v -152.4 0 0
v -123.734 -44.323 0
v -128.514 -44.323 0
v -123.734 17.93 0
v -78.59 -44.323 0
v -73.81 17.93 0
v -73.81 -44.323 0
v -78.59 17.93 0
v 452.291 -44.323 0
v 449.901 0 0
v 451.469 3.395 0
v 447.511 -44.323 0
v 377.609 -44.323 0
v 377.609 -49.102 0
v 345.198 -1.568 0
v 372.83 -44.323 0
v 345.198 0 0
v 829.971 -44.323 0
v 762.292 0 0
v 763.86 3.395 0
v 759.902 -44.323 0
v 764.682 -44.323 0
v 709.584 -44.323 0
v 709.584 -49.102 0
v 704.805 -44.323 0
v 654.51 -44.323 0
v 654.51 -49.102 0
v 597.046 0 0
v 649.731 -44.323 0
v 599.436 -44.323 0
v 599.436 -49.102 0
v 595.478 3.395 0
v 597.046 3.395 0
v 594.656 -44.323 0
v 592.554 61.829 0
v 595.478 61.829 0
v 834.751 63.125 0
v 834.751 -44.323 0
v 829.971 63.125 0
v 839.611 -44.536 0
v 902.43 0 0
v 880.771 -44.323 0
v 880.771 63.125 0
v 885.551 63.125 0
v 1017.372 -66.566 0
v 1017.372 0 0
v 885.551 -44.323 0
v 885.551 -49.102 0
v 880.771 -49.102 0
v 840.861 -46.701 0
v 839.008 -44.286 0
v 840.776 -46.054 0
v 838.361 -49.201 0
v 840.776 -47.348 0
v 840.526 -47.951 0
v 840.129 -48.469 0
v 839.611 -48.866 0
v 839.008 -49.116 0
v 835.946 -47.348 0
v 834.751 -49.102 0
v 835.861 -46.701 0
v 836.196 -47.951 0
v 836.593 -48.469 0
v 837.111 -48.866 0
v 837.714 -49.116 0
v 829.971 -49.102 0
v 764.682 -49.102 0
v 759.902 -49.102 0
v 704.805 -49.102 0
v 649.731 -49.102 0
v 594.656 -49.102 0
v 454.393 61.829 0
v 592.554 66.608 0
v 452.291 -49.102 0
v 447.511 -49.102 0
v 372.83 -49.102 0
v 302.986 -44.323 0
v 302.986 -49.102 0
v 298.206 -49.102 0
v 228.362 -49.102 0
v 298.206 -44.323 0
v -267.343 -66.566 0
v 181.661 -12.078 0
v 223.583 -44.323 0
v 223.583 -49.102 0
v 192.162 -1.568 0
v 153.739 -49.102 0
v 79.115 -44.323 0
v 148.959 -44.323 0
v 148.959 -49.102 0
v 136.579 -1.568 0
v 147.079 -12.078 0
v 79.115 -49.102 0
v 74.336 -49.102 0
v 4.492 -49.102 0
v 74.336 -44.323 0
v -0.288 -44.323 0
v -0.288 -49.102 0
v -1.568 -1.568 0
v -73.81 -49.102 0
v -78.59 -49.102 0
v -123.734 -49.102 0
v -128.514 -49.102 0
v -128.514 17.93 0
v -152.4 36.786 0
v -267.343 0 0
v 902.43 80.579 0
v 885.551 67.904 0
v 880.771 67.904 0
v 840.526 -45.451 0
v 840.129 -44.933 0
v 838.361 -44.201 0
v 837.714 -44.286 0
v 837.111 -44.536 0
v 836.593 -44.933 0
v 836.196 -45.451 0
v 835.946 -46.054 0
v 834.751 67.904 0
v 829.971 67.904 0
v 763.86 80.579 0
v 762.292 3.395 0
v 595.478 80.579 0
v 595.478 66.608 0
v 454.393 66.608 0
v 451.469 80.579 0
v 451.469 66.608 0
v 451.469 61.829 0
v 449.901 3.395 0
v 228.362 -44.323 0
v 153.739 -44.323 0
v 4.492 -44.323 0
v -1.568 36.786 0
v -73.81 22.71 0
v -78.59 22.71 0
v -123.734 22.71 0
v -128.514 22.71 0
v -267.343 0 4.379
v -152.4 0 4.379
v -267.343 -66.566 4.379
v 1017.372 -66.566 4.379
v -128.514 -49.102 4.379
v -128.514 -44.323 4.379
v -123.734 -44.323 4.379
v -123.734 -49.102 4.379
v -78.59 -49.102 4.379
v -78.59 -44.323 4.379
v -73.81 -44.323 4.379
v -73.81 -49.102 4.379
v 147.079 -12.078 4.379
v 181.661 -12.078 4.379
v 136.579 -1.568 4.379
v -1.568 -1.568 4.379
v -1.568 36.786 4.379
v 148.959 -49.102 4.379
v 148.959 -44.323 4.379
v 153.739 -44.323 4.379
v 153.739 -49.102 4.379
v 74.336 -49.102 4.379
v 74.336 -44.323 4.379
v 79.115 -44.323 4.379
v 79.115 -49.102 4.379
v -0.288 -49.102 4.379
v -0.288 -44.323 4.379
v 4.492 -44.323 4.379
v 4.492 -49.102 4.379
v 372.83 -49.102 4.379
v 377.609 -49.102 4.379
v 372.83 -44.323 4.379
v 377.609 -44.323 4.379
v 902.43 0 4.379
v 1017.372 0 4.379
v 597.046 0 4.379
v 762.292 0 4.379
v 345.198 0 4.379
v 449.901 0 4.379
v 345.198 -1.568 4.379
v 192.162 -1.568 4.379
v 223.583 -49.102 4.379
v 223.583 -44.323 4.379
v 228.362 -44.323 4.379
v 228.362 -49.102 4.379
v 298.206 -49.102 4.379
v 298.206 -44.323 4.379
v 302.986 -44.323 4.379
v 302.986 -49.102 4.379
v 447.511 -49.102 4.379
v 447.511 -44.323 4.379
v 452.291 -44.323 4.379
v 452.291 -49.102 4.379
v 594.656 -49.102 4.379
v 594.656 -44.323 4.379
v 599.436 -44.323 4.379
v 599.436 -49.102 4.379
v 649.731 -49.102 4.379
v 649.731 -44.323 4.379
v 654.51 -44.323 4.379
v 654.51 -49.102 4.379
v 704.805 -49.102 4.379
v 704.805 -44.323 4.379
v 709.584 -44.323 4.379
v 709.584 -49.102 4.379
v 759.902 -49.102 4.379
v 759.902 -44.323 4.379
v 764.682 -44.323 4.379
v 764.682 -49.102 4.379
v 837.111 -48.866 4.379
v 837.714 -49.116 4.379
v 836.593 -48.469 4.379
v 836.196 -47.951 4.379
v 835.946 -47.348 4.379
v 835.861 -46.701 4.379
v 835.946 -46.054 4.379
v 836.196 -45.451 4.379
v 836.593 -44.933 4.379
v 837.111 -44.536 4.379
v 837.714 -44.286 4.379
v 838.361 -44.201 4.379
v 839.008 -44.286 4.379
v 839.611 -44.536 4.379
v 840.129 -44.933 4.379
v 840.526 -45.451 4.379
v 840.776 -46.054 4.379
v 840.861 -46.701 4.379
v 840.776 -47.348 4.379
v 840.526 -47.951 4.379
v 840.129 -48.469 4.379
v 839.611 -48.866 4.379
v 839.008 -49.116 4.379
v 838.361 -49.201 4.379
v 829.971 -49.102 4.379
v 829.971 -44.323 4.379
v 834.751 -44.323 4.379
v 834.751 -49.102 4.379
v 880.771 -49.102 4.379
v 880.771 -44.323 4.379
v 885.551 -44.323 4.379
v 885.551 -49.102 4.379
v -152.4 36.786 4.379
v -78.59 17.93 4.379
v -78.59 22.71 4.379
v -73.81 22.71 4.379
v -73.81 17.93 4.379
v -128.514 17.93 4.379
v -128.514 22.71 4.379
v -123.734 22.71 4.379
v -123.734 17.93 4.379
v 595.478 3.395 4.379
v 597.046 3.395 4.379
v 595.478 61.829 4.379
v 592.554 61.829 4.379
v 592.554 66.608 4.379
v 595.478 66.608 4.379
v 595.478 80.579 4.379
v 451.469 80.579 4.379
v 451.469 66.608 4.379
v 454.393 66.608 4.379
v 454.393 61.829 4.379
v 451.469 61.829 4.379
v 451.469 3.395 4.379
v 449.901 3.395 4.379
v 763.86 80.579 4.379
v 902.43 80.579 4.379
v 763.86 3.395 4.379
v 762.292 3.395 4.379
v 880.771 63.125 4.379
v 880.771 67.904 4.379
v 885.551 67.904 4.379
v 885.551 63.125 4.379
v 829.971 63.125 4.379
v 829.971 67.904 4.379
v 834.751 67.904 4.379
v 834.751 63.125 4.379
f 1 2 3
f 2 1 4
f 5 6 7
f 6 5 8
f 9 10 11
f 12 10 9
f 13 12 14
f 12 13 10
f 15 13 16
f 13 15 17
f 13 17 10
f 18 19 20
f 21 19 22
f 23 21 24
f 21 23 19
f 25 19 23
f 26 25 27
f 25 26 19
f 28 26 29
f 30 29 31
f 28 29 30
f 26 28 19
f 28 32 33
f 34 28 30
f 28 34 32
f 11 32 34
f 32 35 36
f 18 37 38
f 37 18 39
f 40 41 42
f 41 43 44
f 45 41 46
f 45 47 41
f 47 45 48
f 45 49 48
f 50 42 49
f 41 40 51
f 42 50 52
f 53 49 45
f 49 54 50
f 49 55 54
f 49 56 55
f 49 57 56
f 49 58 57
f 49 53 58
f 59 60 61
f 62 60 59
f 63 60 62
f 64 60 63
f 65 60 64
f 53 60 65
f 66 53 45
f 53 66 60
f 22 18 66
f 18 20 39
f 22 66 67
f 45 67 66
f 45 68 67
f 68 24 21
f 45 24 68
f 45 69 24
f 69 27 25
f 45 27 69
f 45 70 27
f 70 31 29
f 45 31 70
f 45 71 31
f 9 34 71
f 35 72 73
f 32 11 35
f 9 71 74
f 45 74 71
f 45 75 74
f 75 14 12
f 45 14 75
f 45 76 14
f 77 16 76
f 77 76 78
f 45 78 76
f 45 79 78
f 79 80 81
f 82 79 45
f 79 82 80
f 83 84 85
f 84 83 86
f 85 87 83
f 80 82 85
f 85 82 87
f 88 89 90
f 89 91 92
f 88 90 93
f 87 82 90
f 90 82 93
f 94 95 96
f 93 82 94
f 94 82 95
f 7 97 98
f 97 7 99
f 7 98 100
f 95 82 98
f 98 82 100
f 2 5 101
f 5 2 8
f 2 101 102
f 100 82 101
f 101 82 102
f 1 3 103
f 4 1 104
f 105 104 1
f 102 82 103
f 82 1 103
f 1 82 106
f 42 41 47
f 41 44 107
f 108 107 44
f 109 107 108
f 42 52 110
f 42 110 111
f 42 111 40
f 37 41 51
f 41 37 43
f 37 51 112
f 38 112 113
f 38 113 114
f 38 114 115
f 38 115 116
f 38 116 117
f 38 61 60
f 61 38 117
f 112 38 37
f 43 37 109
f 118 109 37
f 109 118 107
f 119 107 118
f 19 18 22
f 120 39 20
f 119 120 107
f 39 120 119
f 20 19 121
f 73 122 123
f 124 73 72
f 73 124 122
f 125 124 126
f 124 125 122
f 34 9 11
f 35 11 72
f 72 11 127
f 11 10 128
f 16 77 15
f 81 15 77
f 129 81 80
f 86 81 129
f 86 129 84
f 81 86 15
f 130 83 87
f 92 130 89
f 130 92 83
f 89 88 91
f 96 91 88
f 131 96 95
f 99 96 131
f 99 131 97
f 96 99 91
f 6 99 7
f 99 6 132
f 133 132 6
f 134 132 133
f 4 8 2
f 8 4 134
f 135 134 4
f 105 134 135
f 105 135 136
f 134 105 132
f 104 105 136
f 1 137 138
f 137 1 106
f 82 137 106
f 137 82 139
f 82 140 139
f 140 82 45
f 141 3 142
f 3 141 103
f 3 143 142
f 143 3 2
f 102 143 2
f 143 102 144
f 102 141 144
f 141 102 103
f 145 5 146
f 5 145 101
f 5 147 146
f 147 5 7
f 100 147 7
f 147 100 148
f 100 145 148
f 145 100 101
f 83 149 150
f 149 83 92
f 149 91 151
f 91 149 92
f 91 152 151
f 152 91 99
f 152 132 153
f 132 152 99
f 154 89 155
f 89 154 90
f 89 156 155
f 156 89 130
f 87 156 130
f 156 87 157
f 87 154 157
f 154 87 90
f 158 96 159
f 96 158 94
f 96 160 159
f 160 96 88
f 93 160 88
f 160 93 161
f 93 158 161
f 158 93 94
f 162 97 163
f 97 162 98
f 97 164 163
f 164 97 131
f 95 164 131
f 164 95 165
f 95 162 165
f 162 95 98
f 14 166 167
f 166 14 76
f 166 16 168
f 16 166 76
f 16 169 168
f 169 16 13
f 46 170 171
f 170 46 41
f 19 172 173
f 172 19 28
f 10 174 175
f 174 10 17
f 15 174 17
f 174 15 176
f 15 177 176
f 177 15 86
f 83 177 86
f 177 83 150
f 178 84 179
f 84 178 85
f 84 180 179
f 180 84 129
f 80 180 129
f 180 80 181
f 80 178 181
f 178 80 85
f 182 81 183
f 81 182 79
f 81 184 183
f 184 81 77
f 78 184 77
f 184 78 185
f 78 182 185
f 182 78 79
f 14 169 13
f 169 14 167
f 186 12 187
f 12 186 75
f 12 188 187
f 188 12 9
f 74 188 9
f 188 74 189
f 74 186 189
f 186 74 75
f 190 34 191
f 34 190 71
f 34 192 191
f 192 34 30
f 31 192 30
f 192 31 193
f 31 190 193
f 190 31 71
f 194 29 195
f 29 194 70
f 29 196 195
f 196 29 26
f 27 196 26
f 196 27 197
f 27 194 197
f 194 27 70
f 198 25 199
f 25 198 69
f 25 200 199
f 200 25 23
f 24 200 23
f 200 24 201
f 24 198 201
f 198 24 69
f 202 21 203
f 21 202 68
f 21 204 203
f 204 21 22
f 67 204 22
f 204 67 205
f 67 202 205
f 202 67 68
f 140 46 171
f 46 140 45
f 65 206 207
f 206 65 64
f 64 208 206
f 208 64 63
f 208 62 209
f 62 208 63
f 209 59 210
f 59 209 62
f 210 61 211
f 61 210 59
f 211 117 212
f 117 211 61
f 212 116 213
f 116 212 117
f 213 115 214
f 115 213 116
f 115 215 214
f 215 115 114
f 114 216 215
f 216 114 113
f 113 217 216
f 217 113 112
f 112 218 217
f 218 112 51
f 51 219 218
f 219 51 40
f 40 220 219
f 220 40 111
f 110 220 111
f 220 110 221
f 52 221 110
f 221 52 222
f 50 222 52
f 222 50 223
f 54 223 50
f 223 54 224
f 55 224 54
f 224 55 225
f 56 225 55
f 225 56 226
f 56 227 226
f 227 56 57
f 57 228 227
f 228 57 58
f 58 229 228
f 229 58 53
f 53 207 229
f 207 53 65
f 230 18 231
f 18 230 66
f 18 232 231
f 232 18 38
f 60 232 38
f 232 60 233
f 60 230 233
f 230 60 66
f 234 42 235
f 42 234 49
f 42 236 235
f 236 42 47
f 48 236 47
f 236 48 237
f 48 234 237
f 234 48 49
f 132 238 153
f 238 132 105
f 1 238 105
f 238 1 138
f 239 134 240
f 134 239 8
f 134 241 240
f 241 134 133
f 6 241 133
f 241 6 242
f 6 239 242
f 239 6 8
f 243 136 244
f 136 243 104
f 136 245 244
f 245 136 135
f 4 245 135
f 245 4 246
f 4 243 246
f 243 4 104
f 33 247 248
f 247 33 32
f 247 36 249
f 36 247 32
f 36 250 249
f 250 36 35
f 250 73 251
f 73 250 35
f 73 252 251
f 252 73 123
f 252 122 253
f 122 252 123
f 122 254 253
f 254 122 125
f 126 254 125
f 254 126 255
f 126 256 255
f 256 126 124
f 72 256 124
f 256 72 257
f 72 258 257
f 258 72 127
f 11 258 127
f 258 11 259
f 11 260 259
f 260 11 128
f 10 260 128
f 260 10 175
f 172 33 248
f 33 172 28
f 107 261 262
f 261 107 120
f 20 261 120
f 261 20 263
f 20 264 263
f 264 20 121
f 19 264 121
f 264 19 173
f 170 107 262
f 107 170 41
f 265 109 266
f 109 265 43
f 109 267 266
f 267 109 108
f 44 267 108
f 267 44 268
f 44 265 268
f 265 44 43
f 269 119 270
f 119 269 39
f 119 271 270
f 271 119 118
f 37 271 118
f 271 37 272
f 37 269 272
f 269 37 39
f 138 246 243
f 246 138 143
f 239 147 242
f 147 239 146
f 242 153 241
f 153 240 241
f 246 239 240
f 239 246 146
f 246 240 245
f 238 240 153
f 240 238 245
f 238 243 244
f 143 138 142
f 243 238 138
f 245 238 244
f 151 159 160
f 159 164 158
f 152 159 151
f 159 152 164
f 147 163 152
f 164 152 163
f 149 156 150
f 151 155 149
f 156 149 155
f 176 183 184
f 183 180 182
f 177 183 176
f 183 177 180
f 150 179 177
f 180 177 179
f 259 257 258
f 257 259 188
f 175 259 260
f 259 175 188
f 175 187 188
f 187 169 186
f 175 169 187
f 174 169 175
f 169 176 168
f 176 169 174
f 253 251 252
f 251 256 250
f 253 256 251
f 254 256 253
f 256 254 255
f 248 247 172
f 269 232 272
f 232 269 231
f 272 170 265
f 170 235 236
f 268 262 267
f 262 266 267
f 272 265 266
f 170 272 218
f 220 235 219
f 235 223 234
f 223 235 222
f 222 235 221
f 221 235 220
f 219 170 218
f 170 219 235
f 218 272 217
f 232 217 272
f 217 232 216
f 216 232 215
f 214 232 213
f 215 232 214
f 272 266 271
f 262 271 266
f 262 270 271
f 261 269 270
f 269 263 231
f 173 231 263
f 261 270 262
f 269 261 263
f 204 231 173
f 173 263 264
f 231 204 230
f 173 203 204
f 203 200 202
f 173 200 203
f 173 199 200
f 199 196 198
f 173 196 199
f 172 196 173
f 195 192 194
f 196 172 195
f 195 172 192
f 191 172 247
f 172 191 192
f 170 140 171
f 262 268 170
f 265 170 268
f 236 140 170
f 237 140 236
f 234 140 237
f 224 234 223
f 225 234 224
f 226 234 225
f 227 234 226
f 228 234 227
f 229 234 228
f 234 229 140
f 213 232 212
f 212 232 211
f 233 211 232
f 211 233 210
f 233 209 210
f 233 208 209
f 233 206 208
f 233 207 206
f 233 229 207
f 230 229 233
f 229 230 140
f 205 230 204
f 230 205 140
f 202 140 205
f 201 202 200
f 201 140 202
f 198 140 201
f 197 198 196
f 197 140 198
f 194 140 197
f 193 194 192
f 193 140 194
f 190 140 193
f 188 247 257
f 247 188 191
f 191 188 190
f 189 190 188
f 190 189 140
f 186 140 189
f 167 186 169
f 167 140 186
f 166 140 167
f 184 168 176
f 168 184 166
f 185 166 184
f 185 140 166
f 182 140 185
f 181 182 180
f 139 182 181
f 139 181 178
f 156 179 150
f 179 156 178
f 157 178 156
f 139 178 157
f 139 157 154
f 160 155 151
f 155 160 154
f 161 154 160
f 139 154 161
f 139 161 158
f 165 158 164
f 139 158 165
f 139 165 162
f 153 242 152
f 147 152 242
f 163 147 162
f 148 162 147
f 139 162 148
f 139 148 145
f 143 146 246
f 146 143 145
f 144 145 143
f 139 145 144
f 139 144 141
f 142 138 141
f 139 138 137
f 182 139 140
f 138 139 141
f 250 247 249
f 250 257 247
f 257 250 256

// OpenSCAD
// file: ../janesville_common.scad
// =====================================================================
//  CMSP Janesville WI Station - shared settings and footprint
//  Frost & Granger, 1902 as-built prints.  HO scale 1:87 (adapted from the G scale 1:29 model).  Units: model mm.
//  Every other .scad file in this project does:  include <../janesville_common.scad>
// =====================================================================

// ---------- scale ----------
SCALE = 87;
BX = 2;        // brick, slate and tile texture is drawn this many times oversize so a 0.4 mm nozzle can print it
$sc = 0;      // furniture is drawn at the G-scale size and reduced: see g() in Furniture/interior.scad
function ft(f, i = 0) = (f * 12 + i) * 25.4 / ($sc == 0 ? SCALE : $sc);   // real feet + inches -> model mm

// ---------- printer ----------
// "P1S"  = Bambu Lab P1S, 256 x 256 x 256 bed  (use 252 usable)
// "GIGA" = Tom's large-format printer, 800 x 800 x 1000 (use 780 usable)
PRINTER = "P1S";
function bed_for(p) = p == "GIGA" ? [780, 780, 980] : [252, 252, 250];
BED = bed_for(PRINTER);

// ---------- colors (preview only; print color = filament) ----------
PULLMAN_GREEN = "#3B4A2C";   // windows, doors, trim
BRICK_RED     = "#8E3B2C";
MORTAR_WHITE  = "#F2EFE6";
STONE_BUFF    = "#C9B79C";

// ---------- joints between printed sections ----------
PIN_D      = 1.75;   // alignment pin (a stub of 1.75 mm filament)
PIN_CLEAR  = 0.2;   // hole oversize
PIN_DEPTH  = 4;      // hole depth each side of a cut
CUT_BAND   = 3;      // solid band each side of a cut so pins land in plastic

// ---------- NeoPixel wiring ----------
WIRE_CHANNEL = [6, 3.5];   // width x height of notches in under-floor ribs (3-wire bus)
FEED_HOLE_D  = 5;         // hole up through the floor into each room

// ---------- coordinates ----------
// x runs west -> east along the track.  x = 0 at the west end wall line.
// y = 0 at the main track-side wall line, +y toward town.
// Dimensions are to the MAIN WALL LINE (as the drawings are figured).

// Main building, B2077 / B2076.  Overall 128'-5".
X_WEST_END   = 0;
X_PAV_W      = ft(38, 9);                 // general waiting room wing  38'-9"
X_PAV_E      = X_PAV_W + ft(22, 6);       // center pavilion            22'-6"
X_SMOKE_E    = X_PAV_E + ft(36, 10);      // smoking room wing          36'-10"
X_MAIN_E     = X_SMOKE_E + ft(30, 4);     // lunch room wing            30'-4"  -> 128'-5"
MAIN_DEPTH   = ft(32, 0);                 // west wing, pavilion, smoking wing

// Lunch-room wing is narrower: 25'-4" deep (7'-2" + 11'-0" + 7'-2"),
// set back 1'-5" on the track side and 5'-3" on the town side.  VERIFY vs B2078/B2079.
LUNCH_Y0     = ft(1, 5);
LUNCH_Y1     = LUNCH_Y0 + ft(25, 4);

// Pavilion projections.  APPROXIMATE - verify against elevations.
PORCH_PROJ   = ft(3, 6);    // town side: two 6'-9" blocks project 3'-6"
PORCH_W      = ft(9, 0);    // recessed porch between them (open to y = MAIN_DEPTH)
BAY_PROJ     = ft(3, 0);    // track side: canted ticket-office bay
BAY_W_WALL   = ft(15, 6);   // bay width at the wall
BAY_W_FRONT  = ft(9, 6);    // bay width at its face
BAY_CX       = ft(46, 11);  // bay center from west end (B2077 track-side chain), not centered on the pavilion

// Baggage & express building, B2077: 47'-2" x 25'-4", 42'-0" east of the main building.
// Track wall assumed in line with the lunch wing.  VERIFY.
X_BAG_W      = X_MAIN_E + ft(42, 0);
X_BAG_E      = X_BAG_W + ft(47, 2);
BAG_Y0       = LUNCH_Y0;
BAG_Y1       = BAG_Y0 + ft(25, 4);

// Wall thicknesses (model mm)
T_MAIN  = 3.0;     // main block exterior walls (real 1'-5" = 5.0 mm, thinned)
T_LIGHT = 2.6;     // lunch wing, porch, bay, baggage building

// Heights (B2082 / B2078)
FLOOR_Z      = ft(1, 9);    // finished floor above finished grade
WALL_H       = ft(19, 0);   // floor to cornice, town side
SILL_H       = ft(2, 9);    // floor to top of window sill
BASE_PROJ    = ft(0, 4);    // stone base / water table projects past the wall line

// ---------- footprints (2D) ----------
module footprint_main() {
    union() {
        translate([X_WEST_END, 0]) square([X_SMOKE_E - X_WEST_END, MAIN_DEPTH]);
        translate([X_SMOKE_E, LUNCH_Y0]) square([X_MAIN_E - X_SMOKE_E, LUNCH_Y1 - LUNCH_Y0]);
        // town-side pavilion blocks with the recessed porch between them
        difference() {
            translate([X_PAV_W, MAIN_DEPTH - 0.01]) square([X_PAV_E - X_PAV_W, PORCH_PROJ]);
            translate([(X_PAV_W + X_PAV_E - PORCH_W) / 2, MAIN_DEPTH - 1]) square([PORCH_W, PORCH_PROJ + 2]);
        }
        // track-side canted bay
        let(cx = BAY_CX)
        polygon([[cx - BAY_W_WALL / 2, 0.01], [cx + BAY_W_WALL / 2, 0.01],
                 [cx + BAY_W_FRONT / 2, -BAY_PROJ], [cx - BAY_W_FRONT / 2, -BAY_PROJ]]);
    }
}

module footprint_baggage() {
    translate([X_BAG_W, BAG_Y0]) square([X_BAG_E - X_BAG_W, BAG_Y1 - BAG_Y0]);
}
// main file
// =====================================================================
//  Brick platform  -  under the whole canopy, out to the track, and 10 m (32.8 ft)
//  beyond each end of the canopy.  Top = 6" below the floor (canopy eave is 12'-0" above it).
//  Brick pavers 8" x 4" in running bond.  Two bodies for the AMS (load together):
//    Platform          brick red            Platform_mortar   white joints (top 0.4 mm only)
//  Square holes let the canopy column footings pass through and locate the columns.
//  Printed flat, brick up.  Sections butt together; they sit on the layout.
// =====================================================================
include <../janesville_common.scad>
use <../Canopy/canopy.scad>

EXT = 10 / 0.3048;                     // 10 m in feet
CE = canopy_x_ends();
PX0 = CE[0] - EXT; PX1 = CE[1] + EXT;  // platform ends (ft)
PY_TRACK = -19;                        // platform edge at the track (ft)
P_TOP = FLOOR_Z + ft(-0.5);            // platform top above grade (mm)
JOINT = 0.3;                           // mortar joint depth (mm)
BRK = [BX * ft(0, 8), BX * ft(0, 4)]; MJ = 0.42; // paver size, joint width (mm)
PL_BX0 = 98 + 1/12 + 30 + 4/12 + 42; PL_BX1 = PL_BX0 + 47 + 2/12; PL_LX1 = 98 + 1/12 + 30 + 4/12;
// regions (ft): the long strip at the track + the three areas behind it
REGIONS = [[PX0, PY_TRACK, PX1, 0], [CE[0], 0, 0, 10.5], [PL_LX1, 0, PL_BX0, 23], [PL_BX1, 0, CE[1], 23]];
PART = "Platform"; TILE = -1; LAYER = -1; LIST = false;

function platform_x() = [PX0, PX1];
function ptiles(bed) = [for (r = REGIONS) let(n = ceil(ft(r[2] - r[0]) / (bed[0] - 10)), w = (r[2] - r[0]) / n)
    for (i = [0 : n - 1]) [r[0] + i * w, r[1], r[0] + (i + 1) * w, r[3]]];
function platform_count(bed) = len(ptiles(bed));
function platform_parts(bed) = [["Platform", platform_count(bed)], ["Platform_mortar", platform_count(bed)]];

module plat2d() difference() {
    for (r = REGIONS) translate([ft(r[0]), ft(r[1])]) square([ft(r[2] - r[0]), ft(r[3] - r[1])]);
    offset(delta = BASE_PROJ + 0.4) { footprint_main(); footprint_baggage(); }
    for (p = canopy_post_xy()) translate([ft(p[0]), ft(p[1])]) square(ft(1.25) + 0.4, center = true);
    translate([ft(PL_BX1 + 20) + 6, ft(-13.33)]) circle(d = 5, $fn = 24);      // wire slot beside the east-shelter column: canopy lighting riser
}
module tile2d(t) intersection() { plat2d(); translate([ft(t[0]), ft(t[1])]) square([ft(t[2] - t[0]), ft(t[3] - t[1])]); }
module grooves(t) {
    x0 = ft(t[0]); x1 = ft(t[2]); y0 = ft(t[1]); y1 = ft(t[3]); px = BRK[0]; py = BRK[1];
    for (j = [floor(y0 / py) : ceil(y1 / py)]) {
        translate([x0 - 1, j * py - MJ / 2]) square([x1 - x0 + 2, MJ]);
        for (i = [floor(x0 / px) - 1 : ceil(x1 / px)]) translate([(i + (j % 2 == 0 ? 0 : 0.5)) * px - MJ / 2, j * py]) square([MJ, py]);
    }
}
module platform_layer(tile, k, bed = BED) {
    T = ptiles(bed);
    for (i = [0 : len(T) - 1]) if (tile < 0 || tile == i) translate(tile < 0 ? [0, 0, 0] : [-ft(T[i][0]), -ft(T[i][1]), 0]) {
        if (k == 0) linear_extrude(P_TOP - JOINT) tile2d(T[i]);
        if (k == 1) translate([0, 0, P_TOP - JOINT]) linear_extrude(JOINT) difference() { tile2d(T[i]); if (tile >= 0) grooves(T[i]); }
        if (k == 2 && tile >= 0) translate([0, 0, P_TOP - JOINT]) linear_extrude(JOINT) intersection() { tile2d(T[i]); grooves(T[i]); }
    }
}
module platform_part(n, tile = -1, bed = BED) {
    if (n == "Platform") { platform_layer(tile, 0, bed); platform_layer(tile, 1, bed); }
    if (n == "Platform_mortar") platform_layer(tile, 2, bed);
}
module platform_place() color(BRICK_RED) { platform_layer(-1, 0); platform_layer(-1, 1); }

if (LIST) for (p = platform_parts(BED)) echo(str("PPART|", p[0], "|", p[1]));
else if (LAYER >= 0) platform_layer(TILE, LAYER, BED);
else platform_part(PART, TILE, BED);
